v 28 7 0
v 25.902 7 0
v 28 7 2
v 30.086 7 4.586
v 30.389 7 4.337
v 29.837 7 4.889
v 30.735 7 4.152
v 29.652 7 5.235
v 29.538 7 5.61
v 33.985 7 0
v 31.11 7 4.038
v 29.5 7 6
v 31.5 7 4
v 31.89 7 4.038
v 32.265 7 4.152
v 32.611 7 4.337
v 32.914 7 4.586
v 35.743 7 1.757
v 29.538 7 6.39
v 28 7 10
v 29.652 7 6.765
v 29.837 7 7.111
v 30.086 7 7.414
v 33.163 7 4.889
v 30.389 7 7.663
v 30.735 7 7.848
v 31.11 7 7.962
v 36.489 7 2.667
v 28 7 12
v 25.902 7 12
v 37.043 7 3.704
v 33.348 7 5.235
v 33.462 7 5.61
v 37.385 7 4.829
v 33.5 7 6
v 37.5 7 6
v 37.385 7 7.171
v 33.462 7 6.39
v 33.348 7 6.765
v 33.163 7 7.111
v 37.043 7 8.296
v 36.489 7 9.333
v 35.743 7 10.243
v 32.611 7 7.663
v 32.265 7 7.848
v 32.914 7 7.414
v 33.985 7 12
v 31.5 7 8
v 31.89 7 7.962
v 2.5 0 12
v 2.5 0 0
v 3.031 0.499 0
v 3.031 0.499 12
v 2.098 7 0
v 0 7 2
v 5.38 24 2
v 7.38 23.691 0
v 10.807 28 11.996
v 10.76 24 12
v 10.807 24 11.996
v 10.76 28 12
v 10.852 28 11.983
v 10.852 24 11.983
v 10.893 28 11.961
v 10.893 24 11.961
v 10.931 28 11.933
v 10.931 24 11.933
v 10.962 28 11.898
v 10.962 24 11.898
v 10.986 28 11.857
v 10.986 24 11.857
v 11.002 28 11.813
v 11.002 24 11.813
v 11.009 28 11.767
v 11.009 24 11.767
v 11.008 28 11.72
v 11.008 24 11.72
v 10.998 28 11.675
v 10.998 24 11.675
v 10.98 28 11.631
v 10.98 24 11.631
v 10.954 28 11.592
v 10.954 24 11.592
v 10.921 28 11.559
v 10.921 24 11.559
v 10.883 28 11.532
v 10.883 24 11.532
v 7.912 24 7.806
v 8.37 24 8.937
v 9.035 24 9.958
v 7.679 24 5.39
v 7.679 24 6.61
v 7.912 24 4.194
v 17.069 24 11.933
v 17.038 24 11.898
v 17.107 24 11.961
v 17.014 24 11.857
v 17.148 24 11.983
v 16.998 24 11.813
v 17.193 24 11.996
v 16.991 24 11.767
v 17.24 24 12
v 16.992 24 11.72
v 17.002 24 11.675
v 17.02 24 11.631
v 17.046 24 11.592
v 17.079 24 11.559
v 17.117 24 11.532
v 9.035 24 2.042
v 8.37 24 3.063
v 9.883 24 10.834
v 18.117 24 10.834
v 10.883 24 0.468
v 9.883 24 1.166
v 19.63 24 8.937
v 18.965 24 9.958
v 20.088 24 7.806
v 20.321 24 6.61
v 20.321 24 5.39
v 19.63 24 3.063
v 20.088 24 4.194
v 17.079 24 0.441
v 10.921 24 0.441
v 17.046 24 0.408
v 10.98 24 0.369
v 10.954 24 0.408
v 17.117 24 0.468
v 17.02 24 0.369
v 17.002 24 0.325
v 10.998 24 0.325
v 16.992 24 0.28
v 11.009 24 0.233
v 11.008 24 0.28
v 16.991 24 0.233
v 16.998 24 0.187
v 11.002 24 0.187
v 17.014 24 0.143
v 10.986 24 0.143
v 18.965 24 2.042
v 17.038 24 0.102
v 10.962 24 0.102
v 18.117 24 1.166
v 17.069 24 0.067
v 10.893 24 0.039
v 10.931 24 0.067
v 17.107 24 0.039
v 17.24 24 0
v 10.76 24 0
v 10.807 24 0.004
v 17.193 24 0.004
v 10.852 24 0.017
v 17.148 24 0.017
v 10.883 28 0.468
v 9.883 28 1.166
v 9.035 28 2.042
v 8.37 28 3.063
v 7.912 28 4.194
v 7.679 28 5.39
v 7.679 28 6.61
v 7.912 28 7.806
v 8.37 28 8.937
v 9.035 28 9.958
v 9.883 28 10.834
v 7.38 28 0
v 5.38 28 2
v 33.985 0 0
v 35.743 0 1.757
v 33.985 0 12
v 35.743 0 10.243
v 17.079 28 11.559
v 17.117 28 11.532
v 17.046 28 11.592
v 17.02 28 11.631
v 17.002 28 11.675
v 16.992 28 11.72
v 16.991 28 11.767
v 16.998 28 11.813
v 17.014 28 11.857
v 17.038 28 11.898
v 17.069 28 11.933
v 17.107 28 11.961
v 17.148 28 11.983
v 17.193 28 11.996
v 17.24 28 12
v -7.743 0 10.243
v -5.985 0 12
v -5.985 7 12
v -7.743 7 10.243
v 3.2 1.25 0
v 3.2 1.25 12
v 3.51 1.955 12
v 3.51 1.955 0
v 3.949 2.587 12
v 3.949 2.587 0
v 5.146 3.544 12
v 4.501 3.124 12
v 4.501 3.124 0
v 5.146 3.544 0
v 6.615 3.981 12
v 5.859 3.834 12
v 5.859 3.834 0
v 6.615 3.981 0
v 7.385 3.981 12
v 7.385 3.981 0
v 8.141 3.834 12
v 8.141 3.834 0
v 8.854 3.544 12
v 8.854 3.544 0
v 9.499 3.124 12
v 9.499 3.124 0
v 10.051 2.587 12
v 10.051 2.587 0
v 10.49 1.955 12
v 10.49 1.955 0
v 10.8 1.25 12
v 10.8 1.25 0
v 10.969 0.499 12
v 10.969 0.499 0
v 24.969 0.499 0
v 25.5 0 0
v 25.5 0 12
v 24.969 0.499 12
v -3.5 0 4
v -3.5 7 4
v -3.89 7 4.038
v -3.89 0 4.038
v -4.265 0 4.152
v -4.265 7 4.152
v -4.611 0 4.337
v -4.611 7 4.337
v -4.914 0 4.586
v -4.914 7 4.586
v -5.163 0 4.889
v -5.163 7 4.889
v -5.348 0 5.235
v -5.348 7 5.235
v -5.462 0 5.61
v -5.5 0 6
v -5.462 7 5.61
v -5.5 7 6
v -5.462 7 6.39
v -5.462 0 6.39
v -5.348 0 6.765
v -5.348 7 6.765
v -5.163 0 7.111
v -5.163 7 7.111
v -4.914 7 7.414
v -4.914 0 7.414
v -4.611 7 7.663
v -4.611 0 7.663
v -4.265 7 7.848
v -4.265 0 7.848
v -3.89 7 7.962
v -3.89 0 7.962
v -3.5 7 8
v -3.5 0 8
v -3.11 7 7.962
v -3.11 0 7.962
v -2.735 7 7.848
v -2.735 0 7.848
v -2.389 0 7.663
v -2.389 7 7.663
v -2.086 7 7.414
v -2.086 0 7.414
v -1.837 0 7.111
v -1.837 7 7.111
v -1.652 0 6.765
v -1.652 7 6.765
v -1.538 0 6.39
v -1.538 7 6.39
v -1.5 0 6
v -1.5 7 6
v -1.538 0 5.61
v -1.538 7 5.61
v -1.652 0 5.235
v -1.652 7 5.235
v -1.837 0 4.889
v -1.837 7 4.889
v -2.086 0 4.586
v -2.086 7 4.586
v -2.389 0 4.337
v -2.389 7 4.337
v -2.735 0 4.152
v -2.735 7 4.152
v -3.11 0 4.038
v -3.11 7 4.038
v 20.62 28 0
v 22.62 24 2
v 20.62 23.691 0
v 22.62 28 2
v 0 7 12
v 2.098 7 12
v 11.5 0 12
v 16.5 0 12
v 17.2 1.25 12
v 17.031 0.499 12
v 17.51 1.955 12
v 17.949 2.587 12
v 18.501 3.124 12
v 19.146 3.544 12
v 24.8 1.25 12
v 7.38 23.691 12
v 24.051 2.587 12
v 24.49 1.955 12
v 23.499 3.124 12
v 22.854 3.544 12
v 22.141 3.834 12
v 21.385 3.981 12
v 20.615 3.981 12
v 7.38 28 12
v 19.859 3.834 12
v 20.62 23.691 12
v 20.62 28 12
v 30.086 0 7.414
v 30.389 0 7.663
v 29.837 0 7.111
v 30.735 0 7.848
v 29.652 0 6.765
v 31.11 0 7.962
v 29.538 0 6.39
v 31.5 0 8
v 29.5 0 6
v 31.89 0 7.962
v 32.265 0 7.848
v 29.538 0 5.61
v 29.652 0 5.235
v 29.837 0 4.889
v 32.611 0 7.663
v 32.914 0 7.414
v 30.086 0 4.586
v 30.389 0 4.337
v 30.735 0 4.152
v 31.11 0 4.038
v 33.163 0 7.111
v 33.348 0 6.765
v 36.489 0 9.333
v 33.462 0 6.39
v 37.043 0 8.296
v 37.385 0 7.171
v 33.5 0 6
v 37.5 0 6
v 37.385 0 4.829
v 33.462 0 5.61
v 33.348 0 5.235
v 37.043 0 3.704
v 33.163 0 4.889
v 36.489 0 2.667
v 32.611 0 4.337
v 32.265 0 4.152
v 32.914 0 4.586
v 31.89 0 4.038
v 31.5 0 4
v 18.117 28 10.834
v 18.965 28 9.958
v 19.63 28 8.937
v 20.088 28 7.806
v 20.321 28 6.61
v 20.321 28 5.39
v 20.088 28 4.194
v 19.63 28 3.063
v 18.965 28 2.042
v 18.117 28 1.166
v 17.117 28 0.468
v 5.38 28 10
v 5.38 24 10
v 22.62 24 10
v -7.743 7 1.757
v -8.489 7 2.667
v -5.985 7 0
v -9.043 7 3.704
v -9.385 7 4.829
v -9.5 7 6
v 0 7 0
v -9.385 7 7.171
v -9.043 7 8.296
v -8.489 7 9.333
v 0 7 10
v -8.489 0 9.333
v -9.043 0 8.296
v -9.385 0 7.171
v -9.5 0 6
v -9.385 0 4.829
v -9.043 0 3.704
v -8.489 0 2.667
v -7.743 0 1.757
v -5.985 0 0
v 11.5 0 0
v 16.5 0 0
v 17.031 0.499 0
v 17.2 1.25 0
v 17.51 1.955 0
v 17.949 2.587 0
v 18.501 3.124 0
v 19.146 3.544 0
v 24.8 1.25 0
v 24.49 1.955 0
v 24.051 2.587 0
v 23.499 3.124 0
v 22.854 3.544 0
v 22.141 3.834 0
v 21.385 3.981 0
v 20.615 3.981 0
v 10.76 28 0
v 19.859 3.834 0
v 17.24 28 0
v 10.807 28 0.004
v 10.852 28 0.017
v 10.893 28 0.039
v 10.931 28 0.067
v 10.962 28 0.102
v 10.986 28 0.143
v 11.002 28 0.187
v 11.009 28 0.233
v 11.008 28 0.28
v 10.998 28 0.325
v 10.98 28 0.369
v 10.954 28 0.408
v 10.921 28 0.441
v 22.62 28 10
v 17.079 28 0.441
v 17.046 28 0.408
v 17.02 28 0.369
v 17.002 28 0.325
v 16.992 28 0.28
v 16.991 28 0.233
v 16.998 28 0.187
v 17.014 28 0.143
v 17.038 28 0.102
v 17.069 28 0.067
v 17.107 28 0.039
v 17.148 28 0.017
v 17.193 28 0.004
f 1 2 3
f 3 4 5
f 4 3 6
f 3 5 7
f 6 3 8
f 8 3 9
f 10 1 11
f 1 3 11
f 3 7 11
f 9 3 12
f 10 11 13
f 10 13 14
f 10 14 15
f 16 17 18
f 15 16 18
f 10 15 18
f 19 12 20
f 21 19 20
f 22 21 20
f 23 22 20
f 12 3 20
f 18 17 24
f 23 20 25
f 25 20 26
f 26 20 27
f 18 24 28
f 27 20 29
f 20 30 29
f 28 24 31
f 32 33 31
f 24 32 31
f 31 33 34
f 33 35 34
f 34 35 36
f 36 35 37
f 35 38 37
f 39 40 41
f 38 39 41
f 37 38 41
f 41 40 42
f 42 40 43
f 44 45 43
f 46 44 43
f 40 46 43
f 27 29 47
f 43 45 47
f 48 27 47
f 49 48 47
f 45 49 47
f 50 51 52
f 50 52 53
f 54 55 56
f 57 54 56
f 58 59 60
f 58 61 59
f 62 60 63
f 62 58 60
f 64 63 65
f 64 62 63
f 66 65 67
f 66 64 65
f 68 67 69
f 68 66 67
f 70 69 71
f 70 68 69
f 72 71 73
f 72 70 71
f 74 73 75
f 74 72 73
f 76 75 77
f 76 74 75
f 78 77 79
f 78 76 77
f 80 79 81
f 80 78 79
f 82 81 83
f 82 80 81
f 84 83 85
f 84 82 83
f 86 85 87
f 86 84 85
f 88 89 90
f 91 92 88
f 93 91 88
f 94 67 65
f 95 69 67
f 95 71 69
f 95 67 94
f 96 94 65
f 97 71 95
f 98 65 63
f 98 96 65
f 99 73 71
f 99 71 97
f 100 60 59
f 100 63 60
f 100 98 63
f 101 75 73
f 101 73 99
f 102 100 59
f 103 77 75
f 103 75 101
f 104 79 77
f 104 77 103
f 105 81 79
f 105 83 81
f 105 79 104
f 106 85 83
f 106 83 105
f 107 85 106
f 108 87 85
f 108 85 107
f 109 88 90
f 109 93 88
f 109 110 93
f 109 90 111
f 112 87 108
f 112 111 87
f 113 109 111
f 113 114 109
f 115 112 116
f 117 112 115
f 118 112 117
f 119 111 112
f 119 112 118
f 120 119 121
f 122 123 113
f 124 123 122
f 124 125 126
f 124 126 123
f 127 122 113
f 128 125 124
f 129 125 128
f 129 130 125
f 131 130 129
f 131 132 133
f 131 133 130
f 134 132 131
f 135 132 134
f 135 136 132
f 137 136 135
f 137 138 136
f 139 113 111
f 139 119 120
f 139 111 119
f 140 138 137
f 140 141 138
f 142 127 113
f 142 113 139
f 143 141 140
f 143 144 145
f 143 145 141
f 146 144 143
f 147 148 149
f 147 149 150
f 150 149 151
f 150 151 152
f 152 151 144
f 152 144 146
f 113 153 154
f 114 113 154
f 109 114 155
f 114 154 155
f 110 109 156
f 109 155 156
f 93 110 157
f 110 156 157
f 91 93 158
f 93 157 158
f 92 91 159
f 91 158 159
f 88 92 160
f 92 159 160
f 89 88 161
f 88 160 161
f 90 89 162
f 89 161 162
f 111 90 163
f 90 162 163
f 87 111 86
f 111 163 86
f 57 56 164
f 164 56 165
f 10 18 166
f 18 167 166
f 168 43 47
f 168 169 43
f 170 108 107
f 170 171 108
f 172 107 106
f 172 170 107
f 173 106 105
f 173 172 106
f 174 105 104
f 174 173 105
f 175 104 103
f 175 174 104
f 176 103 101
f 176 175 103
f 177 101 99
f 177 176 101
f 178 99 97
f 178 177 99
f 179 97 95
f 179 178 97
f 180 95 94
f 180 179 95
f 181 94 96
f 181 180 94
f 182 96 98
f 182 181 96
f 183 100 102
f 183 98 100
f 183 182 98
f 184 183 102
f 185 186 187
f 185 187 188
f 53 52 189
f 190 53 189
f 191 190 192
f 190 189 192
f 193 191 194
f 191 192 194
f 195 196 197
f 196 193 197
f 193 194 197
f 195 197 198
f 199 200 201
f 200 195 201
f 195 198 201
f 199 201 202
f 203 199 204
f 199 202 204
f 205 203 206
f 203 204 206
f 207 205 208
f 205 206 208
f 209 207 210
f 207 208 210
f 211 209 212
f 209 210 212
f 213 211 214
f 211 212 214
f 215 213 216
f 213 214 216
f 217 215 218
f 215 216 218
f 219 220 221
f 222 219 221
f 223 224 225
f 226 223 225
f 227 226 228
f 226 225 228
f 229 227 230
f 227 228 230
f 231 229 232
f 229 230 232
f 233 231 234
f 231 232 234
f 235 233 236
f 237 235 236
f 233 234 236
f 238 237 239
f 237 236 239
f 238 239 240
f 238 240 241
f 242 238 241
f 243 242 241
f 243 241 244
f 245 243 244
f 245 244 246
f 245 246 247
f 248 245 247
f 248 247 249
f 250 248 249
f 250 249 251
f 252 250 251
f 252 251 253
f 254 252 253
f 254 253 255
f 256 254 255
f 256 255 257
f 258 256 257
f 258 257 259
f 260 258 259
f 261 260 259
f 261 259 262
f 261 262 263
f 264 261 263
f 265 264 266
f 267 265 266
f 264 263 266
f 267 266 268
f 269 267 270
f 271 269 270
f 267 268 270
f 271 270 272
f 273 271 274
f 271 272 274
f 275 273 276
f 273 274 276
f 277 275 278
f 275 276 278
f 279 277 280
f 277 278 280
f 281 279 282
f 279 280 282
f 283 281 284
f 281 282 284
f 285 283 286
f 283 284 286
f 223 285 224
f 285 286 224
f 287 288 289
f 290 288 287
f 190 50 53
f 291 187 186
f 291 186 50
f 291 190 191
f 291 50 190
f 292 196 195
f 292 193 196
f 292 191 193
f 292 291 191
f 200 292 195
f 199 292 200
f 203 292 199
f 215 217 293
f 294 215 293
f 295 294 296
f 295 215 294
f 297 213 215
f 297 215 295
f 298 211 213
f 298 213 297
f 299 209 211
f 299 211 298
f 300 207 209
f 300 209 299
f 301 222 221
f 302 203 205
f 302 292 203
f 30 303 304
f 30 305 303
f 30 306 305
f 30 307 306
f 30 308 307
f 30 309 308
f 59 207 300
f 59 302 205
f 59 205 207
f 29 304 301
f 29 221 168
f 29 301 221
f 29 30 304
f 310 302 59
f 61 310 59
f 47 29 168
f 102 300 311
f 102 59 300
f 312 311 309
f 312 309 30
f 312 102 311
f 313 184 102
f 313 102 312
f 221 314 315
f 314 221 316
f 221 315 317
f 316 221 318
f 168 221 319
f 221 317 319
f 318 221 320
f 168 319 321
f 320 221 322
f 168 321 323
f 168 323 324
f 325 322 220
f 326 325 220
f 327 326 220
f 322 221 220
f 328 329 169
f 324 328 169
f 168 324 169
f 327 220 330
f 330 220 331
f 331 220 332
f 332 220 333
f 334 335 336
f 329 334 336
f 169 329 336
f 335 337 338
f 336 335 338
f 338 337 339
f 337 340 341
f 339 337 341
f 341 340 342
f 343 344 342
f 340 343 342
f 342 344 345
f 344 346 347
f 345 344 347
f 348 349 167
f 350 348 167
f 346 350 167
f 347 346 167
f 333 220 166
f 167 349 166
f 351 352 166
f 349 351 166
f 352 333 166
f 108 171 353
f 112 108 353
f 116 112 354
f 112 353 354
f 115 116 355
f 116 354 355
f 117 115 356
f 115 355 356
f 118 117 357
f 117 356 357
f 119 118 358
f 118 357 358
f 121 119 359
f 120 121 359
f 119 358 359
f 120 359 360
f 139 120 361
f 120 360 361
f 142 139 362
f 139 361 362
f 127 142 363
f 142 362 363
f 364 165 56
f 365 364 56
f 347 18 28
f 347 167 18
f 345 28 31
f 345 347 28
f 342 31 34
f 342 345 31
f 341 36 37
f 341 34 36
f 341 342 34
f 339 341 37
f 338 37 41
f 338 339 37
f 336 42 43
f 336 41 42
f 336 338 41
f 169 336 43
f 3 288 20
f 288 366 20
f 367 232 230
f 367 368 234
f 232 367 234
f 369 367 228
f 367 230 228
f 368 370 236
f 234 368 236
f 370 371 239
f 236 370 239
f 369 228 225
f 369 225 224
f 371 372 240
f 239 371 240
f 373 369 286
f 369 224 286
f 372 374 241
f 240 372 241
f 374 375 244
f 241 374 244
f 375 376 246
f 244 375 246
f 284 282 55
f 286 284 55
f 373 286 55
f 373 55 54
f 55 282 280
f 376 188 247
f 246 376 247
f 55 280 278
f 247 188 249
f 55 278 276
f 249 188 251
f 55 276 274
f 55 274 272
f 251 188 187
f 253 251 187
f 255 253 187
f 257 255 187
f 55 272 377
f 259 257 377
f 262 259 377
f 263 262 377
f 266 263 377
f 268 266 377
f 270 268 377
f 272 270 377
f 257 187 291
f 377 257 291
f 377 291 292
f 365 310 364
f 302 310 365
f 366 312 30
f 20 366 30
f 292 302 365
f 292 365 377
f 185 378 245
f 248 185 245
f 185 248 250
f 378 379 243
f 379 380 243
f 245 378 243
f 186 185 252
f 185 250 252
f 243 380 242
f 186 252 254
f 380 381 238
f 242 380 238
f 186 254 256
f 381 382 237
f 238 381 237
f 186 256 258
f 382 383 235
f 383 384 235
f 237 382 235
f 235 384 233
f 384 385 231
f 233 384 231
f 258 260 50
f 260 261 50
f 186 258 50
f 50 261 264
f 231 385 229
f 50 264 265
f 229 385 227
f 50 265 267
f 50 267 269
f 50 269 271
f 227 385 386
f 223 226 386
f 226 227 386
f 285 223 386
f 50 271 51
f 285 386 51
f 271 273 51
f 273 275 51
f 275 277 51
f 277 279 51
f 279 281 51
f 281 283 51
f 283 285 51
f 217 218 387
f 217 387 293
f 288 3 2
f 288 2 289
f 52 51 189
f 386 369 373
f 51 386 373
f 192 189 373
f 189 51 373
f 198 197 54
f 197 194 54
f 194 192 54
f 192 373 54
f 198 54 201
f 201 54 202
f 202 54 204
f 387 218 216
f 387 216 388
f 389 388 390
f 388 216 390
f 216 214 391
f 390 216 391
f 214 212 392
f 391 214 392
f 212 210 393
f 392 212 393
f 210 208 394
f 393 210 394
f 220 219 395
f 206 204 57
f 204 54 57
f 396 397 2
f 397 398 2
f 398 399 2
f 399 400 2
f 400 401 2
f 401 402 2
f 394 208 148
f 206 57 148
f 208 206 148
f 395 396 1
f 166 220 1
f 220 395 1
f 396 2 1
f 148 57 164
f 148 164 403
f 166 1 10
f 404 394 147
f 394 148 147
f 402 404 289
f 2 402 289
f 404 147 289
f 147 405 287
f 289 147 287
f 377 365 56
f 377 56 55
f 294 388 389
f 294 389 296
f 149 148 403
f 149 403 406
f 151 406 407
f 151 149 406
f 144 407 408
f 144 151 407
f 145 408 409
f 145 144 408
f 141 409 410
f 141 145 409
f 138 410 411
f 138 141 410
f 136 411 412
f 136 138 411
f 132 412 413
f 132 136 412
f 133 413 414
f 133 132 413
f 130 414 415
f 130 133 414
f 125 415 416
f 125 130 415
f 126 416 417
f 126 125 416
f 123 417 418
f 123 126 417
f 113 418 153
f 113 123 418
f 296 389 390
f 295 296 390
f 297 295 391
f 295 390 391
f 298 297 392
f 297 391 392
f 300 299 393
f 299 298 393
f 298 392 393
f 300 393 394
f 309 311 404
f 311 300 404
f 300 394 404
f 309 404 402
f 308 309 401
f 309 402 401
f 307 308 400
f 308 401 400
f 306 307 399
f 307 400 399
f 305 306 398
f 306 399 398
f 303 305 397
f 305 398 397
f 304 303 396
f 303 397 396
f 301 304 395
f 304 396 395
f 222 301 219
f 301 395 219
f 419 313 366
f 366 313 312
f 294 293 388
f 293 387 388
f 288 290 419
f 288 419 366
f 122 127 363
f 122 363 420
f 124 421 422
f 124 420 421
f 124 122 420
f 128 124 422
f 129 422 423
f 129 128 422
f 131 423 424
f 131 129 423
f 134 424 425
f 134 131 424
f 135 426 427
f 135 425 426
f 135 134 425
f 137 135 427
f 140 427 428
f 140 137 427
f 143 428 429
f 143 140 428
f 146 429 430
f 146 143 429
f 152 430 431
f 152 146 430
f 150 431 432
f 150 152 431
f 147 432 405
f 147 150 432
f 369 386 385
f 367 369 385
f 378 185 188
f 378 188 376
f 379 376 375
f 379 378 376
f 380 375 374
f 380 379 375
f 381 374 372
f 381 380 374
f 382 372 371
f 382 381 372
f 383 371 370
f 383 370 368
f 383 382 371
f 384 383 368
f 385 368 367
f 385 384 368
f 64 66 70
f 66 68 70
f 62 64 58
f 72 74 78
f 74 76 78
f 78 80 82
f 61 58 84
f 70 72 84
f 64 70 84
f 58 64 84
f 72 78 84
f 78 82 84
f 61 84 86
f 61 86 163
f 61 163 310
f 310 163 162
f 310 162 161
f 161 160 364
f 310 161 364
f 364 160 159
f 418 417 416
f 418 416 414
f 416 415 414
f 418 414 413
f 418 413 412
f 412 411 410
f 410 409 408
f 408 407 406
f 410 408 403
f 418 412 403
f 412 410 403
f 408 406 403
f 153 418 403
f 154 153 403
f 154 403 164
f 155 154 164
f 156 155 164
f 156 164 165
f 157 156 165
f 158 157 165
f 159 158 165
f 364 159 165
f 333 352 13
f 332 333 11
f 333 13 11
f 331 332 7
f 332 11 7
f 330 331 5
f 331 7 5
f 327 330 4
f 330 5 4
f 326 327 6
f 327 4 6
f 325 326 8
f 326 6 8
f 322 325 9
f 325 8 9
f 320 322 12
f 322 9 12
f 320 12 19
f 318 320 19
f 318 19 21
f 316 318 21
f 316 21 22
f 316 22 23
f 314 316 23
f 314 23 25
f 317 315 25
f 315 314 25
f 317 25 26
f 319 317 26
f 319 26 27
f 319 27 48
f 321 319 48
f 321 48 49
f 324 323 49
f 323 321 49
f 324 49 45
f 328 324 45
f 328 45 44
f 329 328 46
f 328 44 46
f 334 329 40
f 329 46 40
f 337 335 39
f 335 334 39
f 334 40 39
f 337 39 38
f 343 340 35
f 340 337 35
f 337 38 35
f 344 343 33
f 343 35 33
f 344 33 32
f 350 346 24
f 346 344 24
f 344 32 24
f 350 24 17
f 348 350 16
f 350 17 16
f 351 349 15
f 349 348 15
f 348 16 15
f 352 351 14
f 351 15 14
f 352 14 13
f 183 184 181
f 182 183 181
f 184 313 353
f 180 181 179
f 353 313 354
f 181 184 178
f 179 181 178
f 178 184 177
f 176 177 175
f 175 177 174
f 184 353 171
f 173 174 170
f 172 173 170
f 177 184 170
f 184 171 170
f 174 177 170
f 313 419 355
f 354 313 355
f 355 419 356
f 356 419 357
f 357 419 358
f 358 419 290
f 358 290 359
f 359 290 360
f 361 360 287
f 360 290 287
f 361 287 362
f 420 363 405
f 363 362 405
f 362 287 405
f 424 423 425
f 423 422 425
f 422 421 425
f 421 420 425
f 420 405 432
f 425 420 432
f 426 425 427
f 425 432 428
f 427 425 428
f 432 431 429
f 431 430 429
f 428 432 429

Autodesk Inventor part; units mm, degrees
ref_plane "YZ Plane" through (0, 0, 0) normal (1, 0, 0) x (0, 1, 0)
ref_plane "XZ Plane" through (0, 0, 0) normal (0, 1, 0) x (-1, 0, 0)
sketch "Sketch1" plane through (0, 0, 0) normal (0, 0, 1) x (1, 0, 0)
  line L0 (0, 0) -> (28, 0)
  line L1 (28, 0) -> (28, 28)
  line L2 (28, 28) -> (0, 28)
  line L3 (0, 28) -> (0, 0)
  circle A0 centre (7, 0) radius 4
  circle A1 centre (21, 0) radius 4
  point P0 (3, 0)
  point P1 (11, 0)
  point P2 (17, 0)
  point P3 (25, 0)
  dimension "d0" = 28
  dimension "d1" = 28
  dimension "d2" = 8
  dimension "d3" = 8
  dimension "d4" = 14
  dimension "d5" = 7
  dimension "d6" = 7
extrude "Extrusion1" add sketch "Sketch1" along normal blind 12 contours A1 L0 A0 L3 L2 L1
chamfer "Chamfer1" distance 0.5 angle 45 4 edges at (3, 0, 6) (11, 0, 6) (17, 0, 6) (25, 0, 6)
sketch "Sketch2" plane through (0, 28, 0) normal (0, 1, 0) x (1, 0, 0)
  circle A0 centre (14, -6) radius 6.35
  line L0 (28, 0) -> (0, 0) projected
  line L1 (28, 0) -> (28, -12) projected
  point P0 (14, 0)
  point P1 (28, -6)
  point P2 (16.0791, 0)
  point P3 (11.9209, 0)
  dimension "d12" = 12.7
extrude "Extrusion2" cut sketch "Sketch2" against normal blind 4 contours A0 L0 picked at (13.6383, -8.0675)
fillet "Fillet1" radius 0.25 4 edges at (11.9209, 26, 0) (16.0791, 26, 0) (11.9209, 26, 12) (16.0791, 26, 12)
ref_plane "Work Plane3" through (14, 0, 0) normal (-1, 0, 0) x (0, 0, 1)
sketch "Sketch5" plane through (0, 0, 0) normal (0, -1, 0) x (1, 0, 0)
  circle A0 centre (-3.5, 6) radius 2
  circle A1 centre (-3.5, 6) radius 3.5
  circle A2 centre (-3.5, 6) radius 6
  line L0 (2.5, 12) -> (2.5, 0) projected
  line L1 (0, 12) -> (2.5, 12) projected
  line L2 (0, 0) -> (0, 12) projected
  line L3 (0, 0) -> (2.5, 0) projected
  line L4 (0, 0) -> (0, 12) projected
  line L5 (0, 0) -> (-5.9853, 0)
  line L6 (-5.9853, 0) -> (-7.7426, 1.7574)
  line L7 (0, 12) -> (-5.9853, 12)
  line L8 (-5.9853, 12) -> (-7.7426, 10.2426)
  line L9 (0, 0) -> (0, 12) projected
  dimension "d22" = 4
  dimension "d23" = 7
  dimension "d24" = 135
  dimension "d25" = 135
extrude "Extrusion3" add sketch "Sketch5" against normal blind 7 contours A0 | A1 | L2 A2 | L2 L5 A2 | A2 L7 L2 | L5 L6 A2 | A2 L8 L7 picked at (-7.4809, 9.2519)
sketch "Sketch6" plane through (2.5, 0, 0) normal (0, -1, 0) x (1, 0, 0)
  arc A0 (-10.2426, 10.2426) -> (-10.2426, 1.7574) centre (-6, 6) ccw projected
  point P0 (-2.5, 0)
hole "Hole1" at (-3.5, 0, 6) direction (0, 1, 0) diameter 4 end through all
mirror "Mirror2" about plane through (14, 0, 0) normal (-1, 0, 0) of "Extrusion3", "Hole1"
sketch "Sketch7" plane through (0, 0, 12) normal (0, 0, 1) x (1, 0, 0)
  line L0 (17.24, 24) -> (10.76, 24) projected
  line L1 (17.1173, 24) -> (17.24, 24) projected
  line L2 (17.1173, 24) -> (17.1173, 24) projected
  line L3 (17.24, 24) -> (17.1173, 24) projected
  line L4 (10.76, 24) -> (17.24, 24) projected
  line L5 (10.8827, 24) -> (10.76, 24) projected
  line L6 (10.8827, 24) -> (10.8827, 24) projected
  line L7 (10.76, 24) -> (10.8827, 24) projected
  line L8 (17.1173, 24) -> (20.35, 24) projected
  line L9 (7.65, 24) -> (10.8827, 24) projected
  line L10 (28, 28) -> (17.24, 28) projected
  line L11 (22.62, 28) -> (22.62, 24)
  line L12 (28, 7) -> (28, 28) projected
  line L13 (22.62, 24) -> (28, 7)
  line L14 (10.76, 28) -> (0, 28) projected
  line L15 (5.38, 28) -> (5.38, 24)
  line L16 (0, 28) -> (0, 7) projected
  line L17 (5.38, 24) -> (0, 7)
  line L18 (17.24, 24) -> (10.76, 24) projected
  point P0 (0, 0)
extrude "Extrusion4" cut sketch "Sketch7" against normal through all
chamfer "Chamfer2" distance 2 angle 45 8 edges at (22.62, 26, 12) (25.31, 15.5, 12) (22.62, 26, 0) (25.31, 15.5, 0) (2.69, 15.5, 12) (2.69, 15.5, 0) (5.38, 26, 0) (5.38, 26, 12)
equation "\"d1\" = MotorHeight"
equation "\"d5\" = d6"
equation "\"MotorHeight\" = MotorHeightBase"
equation "\"MotorHeightBase\" = 28"
properties part number "Magnet Mount"
